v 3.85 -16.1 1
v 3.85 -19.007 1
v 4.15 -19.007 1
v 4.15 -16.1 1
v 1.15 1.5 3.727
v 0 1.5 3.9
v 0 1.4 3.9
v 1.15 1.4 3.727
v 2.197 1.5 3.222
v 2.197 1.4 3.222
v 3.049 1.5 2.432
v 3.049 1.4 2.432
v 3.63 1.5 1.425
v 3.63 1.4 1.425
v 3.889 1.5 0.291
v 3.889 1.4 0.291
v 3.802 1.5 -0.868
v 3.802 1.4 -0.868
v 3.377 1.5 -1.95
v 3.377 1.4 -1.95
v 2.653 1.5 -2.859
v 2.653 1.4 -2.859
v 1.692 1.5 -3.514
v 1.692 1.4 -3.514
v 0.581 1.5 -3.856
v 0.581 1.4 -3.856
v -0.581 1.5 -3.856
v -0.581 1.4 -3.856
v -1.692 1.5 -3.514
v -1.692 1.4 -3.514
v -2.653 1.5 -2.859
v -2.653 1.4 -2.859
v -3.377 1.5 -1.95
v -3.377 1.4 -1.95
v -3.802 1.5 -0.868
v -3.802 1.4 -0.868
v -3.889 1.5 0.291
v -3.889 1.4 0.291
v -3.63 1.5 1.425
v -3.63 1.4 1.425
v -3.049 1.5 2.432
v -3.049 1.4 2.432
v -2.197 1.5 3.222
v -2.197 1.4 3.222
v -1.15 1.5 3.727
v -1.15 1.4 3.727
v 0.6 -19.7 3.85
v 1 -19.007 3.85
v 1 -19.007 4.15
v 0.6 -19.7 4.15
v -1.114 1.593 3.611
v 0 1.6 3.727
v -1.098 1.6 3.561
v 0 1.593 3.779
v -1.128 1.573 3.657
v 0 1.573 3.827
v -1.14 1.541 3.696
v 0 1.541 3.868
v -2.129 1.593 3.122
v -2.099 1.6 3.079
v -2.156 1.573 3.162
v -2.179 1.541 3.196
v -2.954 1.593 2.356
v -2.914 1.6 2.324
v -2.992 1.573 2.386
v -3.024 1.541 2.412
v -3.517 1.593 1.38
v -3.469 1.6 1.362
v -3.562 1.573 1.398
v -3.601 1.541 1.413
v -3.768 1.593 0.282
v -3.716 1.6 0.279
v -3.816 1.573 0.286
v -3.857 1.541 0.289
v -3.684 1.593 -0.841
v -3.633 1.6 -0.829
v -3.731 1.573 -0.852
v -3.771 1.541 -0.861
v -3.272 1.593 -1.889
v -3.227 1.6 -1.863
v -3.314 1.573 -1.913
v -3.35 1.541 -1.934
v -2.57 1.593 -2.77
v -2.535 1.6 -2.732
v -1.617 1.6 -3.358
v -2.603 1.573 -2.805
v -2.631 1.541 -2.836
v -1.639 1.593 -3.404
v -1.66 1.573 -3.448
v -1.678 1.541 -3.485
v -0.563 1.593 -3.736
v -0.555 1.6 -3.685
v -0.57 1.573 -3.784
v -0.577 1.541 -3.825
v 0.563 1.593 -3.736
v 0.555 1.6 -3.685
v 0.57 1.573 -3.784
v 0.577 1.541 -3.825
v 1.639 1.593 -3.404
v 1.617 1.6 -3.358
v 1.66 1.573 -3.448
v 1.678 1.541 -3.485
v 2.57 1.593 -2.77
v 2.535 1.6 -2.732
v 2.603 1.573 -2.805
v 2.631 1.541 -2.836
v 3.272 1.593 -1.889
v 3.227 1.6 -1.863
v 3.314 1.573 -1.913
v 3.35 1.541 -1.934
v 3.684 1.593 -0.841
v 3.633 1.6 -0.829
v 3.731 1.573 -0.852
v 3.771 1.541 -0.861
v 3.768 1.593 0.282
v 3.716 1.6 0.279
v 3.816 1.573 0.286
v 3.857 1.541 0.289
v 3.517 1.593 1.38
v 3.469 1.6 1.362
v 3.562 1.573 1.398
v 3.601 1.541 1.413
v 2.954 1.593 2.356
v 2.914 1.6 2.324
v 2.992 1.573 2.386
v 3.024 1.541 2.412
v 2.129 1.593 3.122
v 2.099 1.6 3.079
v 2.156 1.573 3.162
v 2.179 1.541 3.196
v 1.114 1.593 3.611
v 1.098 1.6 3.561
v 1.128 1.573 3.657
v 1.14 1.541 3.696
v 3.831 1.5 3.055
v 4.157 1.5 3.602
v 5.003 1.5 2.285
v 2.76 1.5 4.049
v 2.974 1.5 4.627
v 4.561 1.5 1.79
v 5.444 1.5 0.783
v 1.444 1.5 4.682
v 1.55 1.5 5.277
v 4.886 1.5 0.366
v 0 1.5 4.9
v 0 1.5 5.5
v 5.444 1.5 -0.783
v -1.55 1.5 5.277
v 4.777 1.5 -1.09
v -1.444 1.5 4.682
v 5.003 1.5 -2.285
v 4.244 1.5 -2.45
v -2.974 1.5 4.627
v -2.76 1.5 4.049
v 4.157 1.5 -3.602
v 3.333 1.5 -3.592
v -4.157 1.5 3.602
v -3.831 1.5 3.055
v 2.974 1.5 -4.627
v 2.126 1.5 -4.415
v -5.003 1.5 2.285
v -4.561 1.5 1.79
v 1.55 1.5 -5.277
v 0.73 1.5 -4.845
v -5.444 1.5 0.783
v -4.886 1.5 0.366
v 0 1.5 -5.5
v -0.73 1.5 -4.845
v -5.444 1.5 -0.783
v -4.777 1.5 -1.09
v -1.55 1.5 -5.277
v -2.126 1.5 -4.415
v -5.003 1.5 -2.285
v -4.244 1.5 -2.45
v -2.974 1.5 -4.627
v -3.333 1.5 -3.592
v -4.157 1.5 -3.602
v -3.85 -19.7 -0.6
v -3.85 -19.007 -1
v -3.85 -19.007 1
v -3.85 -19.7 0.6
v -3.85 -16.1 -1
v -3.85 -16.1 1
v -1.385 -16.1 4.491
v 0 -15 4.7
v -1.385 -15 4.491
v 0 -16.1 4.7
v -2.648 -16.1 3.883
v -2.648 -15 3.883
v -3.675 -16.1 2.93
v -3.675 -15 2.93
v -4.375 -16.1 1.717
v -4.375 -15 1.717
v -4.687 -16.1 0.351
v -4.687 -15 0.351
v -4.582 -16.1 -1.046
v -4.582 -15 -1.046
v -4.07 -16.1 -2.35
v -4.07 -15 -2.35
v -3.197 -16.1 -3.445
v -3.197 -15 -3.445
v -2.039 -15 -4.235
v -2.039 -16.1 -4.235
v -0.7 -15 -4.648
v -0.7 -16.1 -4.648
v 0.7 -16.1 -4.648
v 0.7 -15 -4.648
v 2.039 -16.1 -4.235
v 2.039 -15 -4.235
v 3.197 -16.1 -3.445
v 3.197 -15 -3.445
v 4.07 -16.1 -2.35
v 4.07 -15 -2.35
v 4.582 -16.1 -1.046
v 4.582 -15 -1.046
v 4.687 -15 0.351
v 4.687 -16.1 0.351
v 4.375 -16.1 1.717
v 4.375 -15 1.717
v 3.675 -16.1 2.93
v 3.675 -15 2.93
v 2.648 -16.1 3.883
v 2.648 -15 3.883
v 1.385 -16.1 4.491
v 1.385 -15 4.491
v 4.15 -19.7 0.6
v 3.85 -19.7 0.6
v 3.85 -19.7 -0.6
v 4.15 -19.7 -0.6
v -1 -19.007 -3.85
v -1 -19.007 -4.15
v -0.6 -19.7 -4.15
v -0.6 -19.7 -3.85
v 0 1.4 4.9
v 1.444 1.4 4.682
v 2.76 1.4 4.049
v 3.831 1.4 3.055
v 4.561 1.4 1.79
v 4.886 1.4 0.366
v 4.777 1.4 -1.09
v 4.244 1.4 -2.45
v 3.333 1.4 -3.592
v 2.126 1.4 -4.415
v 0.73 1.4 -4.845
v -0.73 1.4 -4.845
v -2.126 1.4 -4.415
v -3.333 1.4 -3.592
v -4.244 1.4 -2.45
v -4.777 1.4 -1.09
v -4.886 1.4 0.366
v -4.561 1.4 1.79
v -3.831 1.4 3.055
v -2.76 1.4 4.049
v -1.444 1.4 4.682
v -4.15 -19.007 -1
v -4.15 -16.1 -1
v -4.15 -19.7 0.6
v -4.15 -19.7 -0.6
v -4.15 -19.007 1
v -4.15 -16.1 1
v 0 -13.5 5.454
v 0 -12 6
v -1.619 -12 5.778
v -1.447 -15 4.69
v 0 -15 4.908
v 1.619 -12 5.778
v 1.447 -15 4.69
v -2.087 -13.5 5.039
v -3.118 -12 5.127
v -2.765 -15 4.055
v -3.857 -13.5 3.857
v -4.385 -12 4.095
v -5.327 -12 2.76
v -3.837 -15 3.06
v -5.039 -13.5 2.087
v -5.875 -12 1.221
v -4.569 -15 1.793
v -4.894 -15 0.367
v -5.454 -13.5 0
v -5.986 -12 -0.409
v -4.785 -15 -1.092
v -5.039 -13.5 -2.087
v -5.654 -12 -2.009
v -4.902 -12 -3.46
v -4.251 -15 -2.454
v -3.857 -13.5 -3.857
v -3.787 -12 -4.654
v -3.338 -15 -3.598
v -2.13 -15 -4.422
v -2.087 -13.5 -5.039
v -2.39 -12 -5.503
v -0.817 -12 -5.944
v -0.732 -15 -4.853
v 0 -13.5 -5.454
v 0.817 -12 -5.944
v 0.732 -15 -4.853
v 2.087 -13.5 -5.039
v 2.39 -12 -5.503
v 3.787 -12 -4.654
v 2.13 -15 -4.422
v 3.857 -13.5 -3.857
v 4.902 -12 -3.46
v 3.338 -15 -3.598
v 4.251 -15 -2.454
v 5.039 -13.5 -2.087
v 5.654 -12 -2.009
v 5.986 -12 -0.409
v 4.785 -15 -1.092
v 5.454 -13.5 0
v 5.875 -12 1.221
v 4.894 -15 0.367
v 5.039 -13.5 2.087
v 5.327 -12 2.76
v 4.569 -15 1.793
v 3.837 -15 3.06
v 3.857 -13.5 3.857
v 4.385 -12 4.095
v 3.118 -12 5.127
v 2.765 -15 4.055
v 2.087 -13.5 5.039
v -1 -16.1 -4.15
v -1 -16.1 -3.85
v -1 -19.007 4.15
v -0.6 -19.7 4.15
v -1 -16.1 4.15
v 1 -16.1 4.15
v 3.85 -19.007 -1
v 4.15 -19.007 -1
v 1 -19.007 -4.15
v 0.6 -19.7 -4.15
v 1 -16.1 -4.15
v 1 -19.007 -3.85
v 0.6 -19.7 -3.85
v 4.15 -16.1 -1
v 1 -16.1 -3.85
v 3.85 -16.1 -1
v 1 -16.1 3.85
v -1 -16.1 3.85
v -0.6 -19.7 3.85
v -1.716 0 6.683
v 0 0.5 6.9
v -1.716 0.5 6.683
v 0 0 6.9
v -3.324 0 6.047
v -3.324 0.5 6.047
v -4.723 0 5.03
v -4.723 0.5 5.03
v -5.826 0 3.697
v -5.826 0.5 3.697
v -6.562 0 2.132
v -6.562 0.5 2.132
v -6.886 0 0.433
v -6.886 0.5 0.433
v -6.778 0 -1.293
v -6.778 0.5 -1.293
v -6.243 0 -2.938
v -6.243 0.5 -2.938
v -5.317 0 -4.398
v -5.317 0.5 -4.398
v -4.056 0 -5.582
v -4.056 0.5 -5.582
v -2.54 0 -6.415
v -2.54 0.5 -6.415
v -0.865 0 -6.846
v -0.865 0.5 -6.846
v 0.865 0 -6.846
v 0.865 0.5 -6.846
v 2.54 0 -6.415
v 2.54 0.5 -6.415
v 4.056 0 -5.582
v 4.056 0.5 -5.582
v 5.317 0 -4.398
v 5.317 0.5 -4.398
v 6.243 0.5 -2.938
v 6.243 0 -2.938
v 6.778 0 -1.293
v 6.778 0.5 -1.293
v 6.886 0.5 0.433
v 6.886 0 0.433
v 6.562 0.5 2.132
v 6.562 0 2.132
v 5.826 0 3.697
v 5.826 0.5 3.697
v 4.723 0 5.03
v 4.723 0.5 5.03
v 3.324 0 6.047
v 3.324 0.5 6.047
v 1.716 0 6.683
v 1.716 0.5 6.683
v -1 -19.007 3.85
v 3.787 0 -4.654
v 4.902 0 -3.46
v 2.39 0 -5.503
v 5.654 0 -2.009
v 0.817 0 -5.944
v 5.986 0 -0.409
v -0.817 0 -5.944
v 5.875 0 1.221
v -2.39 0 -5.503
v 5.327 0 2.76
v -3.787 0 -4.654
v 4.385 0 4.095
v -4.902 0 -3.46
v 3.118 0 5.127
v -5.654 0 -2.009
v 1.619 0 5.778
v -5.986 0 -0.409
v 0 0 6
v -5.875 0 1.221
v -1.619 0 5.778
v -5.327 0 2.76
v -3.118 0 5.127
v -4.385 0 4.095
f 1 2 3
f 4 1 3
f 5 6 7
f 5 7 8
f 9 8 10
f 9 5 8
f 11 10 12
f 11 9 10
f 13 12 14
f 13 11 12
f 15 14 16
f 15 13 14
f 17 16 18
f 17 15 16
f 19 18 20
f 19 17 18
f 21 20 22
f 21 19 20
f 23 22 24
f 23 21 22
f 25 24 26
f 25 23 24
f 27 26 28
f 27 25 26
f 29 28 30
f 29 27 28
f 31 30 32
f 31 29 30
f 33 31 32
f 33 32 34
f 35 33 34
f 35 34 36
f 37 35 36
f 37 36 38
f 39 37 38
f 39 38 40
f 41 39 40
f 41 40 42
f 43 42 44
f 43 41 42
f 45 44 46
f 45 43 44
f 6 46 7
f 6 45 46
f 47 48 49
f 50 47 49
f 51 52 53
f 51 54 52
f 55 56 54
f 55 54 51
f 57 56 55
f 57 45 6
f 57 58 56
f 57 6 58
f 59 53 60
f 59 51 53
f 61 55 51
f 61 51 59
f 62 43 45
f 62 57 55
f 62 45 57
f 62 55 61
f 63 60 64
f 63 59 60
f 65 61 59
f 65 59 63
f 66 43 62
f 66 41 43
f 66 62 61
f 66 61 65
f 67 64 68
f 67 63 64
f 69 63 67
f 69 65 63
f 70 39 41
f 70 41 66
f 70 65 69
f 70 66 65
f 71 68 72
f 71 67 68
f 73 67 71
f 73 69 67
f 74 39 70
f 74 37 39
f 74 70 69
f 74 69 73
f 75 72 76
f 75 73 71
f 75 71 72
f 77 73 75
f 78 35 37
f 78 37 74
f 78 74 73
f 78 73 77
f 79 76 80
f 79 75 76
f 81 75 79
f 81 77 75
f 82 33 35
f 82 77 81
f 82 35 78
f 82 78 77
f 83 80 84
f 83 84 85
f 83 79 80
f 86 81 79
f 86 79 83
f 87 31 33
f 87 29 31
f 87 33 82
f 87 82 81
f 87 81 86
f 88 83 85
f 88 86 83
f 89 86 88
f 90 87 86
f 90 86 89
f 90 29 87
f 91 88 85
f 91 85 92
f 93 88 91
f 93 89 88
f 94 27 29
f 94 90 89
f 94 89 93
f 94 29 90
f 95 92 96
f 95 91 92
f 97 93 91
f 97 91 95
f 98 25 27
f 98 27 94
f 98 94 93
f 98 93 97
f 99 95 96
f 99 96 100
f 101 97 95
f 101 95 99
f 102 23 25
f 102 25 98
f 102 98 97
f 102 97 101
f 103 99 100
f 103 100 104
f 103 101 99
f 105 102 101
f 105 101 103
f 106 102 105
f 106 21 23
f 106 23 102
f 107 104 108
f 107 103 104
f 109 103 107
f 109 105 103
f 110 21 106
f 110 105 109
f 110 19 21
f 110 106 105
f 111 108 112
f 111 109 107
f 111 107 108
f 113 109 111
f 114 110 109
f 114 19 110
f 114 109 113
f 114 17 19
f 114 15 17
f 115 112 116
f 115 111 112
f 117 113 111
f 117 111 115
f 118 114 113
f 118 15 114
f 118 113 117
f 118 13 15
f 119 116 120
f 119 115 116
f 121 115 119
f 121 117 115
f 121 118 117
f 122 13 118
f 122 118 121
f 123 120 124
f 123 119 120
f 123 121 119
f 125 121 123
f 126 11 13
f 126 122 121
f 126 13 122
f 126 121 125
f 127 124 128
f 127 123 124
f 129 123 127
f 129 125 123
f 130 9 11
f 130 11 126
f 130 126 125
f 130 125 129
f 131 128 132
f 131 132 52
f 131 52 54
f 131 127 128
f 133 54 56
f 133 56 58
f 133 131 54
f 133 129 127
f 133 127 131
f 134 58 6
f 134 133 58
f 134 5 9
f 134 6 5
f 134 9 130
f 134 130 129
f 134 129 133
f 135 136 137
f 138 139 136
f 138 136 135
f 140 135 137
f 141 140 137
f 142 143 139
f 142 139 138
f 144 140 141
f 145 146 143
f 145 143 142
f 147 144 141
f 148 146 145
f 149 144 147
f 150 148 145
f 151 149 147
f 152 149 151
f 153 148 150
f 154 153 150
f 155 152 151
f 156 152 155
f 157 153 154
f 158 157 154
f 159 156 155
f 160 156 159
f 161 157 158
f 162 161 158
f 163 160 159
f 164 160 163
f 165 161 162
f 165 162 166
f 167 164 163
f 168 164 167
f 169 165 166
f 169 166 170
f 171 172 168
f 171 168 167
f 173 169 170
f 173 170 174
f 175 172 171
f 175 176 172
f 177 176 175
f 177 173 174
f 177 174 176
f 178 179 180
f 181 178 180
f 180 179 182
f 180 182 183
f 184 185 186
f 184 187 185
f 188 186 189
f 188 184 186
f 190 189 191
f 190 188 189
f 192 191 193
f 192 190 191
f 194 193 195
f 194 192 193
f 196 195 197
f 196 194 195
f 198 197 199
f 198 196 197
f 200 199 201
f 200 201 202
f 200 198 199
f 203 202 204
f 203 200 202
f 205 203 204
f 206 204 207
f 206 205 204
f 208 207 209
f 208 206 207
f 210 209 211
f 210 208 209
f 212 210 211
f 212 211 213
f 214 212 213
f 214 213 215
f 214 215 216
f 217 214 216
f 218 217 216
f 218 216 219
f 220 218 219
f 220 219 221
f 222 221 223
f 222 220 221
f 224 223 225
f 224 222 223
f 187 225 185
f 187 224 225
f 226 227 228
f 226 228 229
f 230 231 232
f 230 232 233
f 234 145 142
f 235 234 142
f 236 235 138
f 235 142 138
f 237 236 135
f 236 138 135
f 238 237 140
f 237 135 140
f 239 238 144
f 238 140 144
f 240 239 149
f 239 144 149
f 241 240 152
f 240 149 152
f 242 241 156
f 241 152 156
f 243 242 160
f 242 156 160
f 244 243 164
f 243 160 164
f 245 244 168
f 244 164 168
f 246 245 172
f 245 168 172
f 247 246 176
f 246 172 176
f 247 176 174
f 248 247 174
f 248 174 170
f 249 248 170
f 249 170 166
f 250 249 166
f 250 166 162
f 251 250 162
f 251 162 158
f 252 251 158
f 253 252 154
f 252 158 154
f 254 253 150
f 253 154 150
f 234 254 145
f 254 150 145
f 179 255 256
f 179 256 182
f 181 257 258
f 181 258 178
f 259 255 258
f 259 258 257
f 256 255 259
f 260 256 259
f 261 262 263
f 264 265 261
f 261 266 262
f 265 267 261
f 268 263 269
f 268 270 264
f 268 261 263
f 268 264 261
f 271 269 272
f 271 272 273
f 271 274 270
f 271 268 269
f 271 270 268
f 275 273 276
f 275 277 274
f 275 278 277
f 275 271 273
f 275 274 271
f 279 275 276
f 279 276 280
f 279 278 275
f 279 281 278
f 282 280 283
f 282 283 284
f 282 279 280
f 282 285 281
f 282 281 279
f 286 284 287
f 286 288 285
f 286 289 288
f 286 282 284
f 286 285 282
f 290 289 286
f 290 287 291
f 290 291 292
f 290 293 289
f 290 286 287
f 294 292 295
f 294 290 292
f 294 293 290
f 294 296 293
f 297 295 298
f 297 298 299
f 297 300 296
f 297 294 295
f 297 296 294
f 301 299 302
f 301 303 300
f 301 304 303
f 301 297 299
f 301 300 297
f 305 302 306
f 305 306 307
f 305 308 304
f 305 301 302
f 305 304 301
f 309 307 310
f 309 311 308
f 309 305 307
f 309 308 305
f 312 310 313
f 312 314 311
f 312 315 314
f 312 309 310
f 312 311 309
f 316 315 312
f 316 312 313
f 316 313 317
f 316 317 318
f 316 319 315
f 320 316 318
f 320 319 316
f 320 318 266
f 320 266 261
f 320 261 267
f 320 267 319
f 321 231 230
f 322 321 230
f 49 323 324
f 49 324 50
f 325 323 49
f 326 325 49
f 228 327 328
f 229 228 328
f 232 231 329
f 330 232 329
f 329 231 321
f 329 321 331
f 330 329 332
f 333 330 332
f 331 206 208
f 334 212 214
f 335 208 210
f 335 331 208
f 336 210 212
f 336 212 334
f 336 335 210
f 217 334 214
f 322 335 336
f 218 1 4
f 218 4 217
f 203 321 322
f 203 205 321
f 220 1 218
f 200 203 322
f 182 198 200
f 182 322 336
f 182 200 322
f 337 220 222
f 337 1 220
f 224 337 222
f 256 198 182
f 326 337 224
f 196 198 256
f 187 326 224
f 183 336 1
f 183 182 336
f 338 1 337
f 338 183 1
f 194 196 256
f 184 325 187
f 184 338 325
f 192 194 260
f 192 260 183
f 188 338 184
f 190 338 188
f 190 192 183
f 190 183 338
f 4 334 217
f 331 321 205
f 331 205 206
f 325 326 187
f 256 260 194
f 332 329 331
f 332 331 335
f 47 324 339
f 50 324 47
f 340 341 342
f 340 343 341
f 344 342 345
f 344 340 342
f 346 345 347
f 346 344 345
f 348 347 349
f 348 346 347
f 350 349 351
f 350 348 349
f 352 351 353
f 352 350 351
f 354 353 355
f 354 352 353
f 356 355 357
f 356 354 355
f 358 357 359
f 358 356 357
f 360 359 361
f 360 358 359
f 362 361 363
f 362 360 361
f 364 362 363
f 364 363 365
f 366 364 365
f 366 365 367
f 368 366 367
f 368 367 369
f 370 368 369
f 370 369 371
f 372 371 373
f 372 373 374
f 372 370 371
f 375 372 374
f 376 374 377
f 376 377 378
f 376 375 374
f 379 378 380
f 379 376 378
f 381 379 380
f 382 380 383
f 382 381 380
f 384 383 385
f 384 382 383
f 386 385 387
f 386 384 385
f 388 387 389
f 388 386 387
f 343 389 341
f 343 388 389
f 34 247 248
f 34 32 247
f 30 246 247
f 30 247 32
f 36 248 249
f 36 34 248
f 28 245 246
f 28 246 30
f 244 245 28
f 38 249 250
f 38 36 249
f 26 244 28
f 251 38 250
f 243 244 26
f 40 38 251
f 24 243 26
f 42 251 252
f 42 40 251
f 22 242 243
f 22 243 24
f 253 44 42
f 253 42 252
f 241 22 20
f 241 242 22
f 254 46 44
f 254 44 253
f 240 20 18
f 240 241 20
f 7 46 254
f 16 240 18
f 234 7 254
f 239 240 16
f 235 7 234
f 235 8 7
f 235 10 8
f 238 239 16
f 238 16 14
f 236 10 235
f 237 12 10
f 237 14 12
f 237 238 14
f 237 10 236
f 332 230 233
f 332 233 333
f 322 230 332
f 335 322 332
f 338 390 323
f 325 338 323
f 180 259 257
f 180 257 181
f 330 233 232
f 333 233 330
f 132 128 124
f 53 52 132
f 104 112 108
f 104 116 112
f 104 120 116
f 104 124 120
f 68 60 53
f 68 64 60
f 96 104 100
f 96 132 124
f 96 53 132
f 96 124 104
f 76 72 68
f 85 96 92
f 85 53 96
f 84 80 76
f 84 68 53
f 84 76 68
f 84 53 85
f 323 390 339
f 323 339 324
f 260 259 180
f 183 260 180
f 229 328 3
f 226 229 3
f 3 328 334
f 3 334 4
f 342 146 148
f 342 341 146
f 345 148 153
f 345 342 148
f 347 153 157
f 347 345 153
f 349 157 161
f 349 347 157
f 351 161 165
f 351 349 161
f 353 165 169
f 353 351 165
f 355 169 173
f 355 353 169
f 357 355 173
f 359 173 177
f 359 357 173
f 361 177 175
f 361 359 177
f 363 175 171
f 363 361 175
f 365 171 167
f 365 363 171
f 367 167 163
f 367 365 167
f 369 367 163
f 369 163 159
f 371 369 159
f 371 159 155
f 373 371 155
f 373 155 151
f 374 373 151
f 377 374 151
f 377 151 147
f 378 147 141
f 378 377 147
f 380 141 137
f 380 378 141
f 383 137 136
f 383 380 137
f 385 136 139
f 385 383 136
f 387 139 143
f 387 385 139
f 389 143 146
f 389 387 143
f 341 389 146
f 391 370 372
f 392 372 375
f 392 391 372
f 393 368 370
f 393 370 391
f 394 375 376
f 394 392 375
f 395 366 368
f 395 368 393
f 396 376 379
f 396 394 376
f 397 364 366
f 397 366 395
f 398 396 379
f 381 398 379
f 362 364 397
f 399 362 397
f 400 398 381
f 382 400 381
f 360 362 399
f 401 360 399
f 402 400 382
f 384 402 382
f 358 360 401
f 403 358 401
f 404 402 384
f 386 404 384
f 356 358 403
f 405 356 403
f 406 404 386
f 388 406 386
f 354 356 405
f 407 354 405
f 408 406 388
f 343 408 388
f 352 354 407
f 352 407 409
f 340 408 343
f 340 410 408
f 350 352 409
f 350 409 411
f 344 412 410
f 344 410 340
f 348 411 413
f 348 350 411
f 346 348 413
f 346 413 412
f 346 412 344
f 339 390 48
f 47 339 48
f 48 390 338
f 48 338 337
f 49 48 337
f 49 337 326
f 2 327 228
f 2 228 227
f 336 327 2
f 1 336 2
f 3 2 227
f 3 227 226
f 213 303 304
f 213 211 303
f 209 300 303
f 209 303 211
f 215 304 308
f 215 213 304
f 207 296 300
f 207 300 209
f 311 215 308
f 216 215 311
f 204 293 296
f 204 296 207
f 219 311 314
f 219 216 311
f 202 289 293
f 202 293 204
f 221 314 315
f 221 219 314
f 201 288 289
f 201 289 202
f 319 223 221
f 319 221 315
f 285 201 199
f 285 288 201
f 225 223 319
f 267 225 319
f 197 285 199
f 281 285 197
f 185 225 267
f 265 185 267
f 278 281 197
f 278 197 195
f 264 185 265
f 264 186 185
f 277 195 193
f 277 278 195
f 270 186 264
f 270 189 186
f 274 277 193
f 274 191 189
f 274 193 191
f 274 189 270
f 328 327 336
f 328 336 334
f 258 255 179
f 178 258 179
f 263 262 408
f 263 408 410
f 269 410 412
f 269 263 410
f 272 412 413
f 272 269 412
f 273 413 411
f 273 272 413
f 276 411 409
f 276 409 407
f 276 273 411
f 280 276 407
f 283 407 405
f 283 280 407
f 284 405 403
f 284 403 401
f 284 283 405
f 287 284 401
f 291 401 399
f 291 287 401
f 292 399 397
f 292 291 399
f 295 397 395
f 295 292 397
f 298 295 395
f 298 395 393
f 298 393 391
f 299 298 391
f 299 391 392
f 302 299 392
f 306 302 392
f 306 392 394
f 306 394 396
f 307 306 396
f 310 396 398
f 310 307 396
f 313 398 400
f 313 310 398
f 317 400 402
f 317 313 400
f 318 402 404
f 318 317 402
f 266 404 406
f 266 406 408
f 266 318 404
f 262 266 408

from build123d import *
from OCP.BRepFilletAPI import BRepFilletAPI_MakeChamfer

# Parameters (mm, degrees)
FILLET1_R           = 0.2
SKETCH2_R           = 4.9
SKETCH2_R_2         = 3.9
CUT_EXTRUDE1_DEPTH  = 0.1
SKETCH3_W           = 2
SKETCH3_H           = 0.3
SKETCH3_W_2         = 0.3
SKETCH3_H_2         = 2
EXTRUDE_THIN1_DEPTH = 3.6
CHAMFER1_SIZE       = 0.4
CHAMFER1_SIZE2      = 0.692820323
CHAMFER2_SIZE       = 3
CHAMFER2_SIZE2      = 1.091910703


with BuildPart() as part:
    # Sketch1 → Revolve1 (revolve)
    with BuildSketch(Plane(origin=(0, 0, 0), x_dir=(0, 0, -1), z_dir=(1, 0, 0))):
        Polygon((0, 1.6), (-3.9, 1.6), (-3.9, 1.5), (-5.5, 1.5), (-6.9, 0.5), (-6.9, 0), (-6, 0), (-6, -15), (-4.7, -15), (-4.7, -16.1), (0, -16.1), align=None)
    revolve(axis=Axis((0, 14.375, 0), (0, -1, 0)))

    # Fillet1
    # the kernel refuses this fillet: 0.2 mm, written as the material it takes off along each edge
    with BuildSketch(Plane(origin=(0, 1.6, 0), x_dir=(0, 0, 1), z_dir=(1, 0, 0))) as fillet1_piece_1:
        with BuildLine():
            CenterArc((3.726794919, 0.2), FILLET1_R, 270, 60)
            Line((3.9, 0.1), (3.903464102, 0.098))
            ThreePointArc((3.903464102, 0.098), (3.904, 0.05), (3.904, 0))
            Line((3.904, 0), (3.9, -0.004))
            Line((3.9, -0.004), (3.726794919, -0.004))
            Line((3.726794919, -0.004), (3.726794919, 0))
        make_face()
    revolve(axis=Axis((0, 1.6, 0), (0, -1, 0)), mode=Mode.SUBTRACT)

    # Sketch2 → Cut-Extrude1 (cut)
    with BuildSketch(Plane(origin=(0, 1.5, 0), x_dir=(1, 0, 0), z_dir=(0, 1, 0))):
        with Locations(Location((0, 0, 0), (0, 0, 270))):
            Circle(SKETCH2_R)
        with Locations(Location((0, 0, 0), (0, 0, 270))):
            Circle(SKETCH2_R_2, mode=Mode.SUBTRACT)
    extrude(amount=-CUT_EXTRUDE1_DEPTH, mode=Mode.SUBTRACT)

    # Sketch3 → Extrude-Thin1 (add)
    with BuildSketch(Plane.XZ.offset(16.1)):
        with Locations((0, 4)):
            Rectangle(SKETCH3_W, SKETCH3_H)
        with Locations((0, -4)):
            Rectangle(SKETCH3_W, SKETCH3_H)
        with Locations((-4, 0)):
            Rectangle(SKETCH3_W_2, SKETCH3_H_2)
        with Locations((4, 0)):
            Rectangle(SKETCH3_W_2, SKETCH3_H_2)
    extrude(amount=EXTRUDE_THIN1_DEPTH)

    # Chamfer1: one chamfer whose edges measure the first distance from different faces: ONE call of the kernel's chamfer builder (chamfer() names one face for all edges)
    chamfer1_edges_1 = [part.edges().sort_by_distance(p)[0] for p in [
        (1, -19.7, 4),
        (-1, -19.7, 4),
    ]]
    chamfer1_side_1 = [part.faces().sort_by_distance(p)[0] for p in [
        (0, -19.7, 4),
    ]]
    chamfer1_edges_2 = [part.edges().sort_by_distance(p)[0] for p in [
        (1, -19.7, -4),
        (-1, -19.7, -4),
    ]]
    chamfer1_side_2 = [part.faces().sort_by_distance(p)[0] for p in [
        (0, -19.7, -4),
    ]]
    chamfer1_edges_3 = [part.edges().sort_by_distance(p)[0] for p in [
        (-4, -19.7, -1),
        (-4, -19.7, 1),
    ]]
    chamfer1_side_3 = [part.faces().sort_by_distance(p)[0] for p in [
        (-4, -19.7, 0),
    ]]
    chamfer1_edges_4 = [part.edges().sort_by_distance(p)[0] for p in [
        (4, -19.7, 1),
        (4, -19.7, -1),
    ]]
    chamfer1_side_4 = [part.faces().sort_by_distance(p)[0] for p in [
        (4, -19.7, 0),
    ]]
    chamfer1 = BRepFilletAPI_MakeChamfer(part.part.solid().wrapped)
    for e in chamfer1_edges_1:
        chamfer1.Add(CHAMFER1_SIZE, CHAMFER1_SIZE2, e.wrapped, chamfer1_side_1[0].wrapped)  # the first distance lies on this face
    for e in chamfer1_edges_2:
        chamfer1.Add(CHAMFER1_SIZE, CHAMFER1_SIZE2, e.wrapped, chamfer1_side_2[0].wrapped)  # the first distance lies on this face
    for e in chamfer1_edges_3:
        chamfer1.Add(CHAMFER1_SIZE, CHAMFER1_SIZE2, e.wrapped, chamfer1_side_3[0].wrapped)  # the first distance lies on this face
    for e in chamfer1_edges_4:
        chamfer1.Add(CHAMFER1_SIZE, CHAMFER1_SIZE2, e.wrapped, chamfer1_side_4[0].wrapped)  # the first distance lies on this face
    add(Compound.cast(chamfer1.Shape()), mode=Mode.REPLACE)

    # Chamfer2
    chamfer2_edges = [part.edges().sort_by_distance(p)[0] for p in [
        (0, -15, -6),
    ]]
    chamfer2_side = [part.faces().sort_by_distance(p)[0] for p in [
        (0, -7.5, -6),
    ]]
    chamfer(chamfer2_edges, length=CHAMFER2_SIZE, length2=CHAMFER2_SIZE2, reference=chamfer2_side[0])


solid = part.part
